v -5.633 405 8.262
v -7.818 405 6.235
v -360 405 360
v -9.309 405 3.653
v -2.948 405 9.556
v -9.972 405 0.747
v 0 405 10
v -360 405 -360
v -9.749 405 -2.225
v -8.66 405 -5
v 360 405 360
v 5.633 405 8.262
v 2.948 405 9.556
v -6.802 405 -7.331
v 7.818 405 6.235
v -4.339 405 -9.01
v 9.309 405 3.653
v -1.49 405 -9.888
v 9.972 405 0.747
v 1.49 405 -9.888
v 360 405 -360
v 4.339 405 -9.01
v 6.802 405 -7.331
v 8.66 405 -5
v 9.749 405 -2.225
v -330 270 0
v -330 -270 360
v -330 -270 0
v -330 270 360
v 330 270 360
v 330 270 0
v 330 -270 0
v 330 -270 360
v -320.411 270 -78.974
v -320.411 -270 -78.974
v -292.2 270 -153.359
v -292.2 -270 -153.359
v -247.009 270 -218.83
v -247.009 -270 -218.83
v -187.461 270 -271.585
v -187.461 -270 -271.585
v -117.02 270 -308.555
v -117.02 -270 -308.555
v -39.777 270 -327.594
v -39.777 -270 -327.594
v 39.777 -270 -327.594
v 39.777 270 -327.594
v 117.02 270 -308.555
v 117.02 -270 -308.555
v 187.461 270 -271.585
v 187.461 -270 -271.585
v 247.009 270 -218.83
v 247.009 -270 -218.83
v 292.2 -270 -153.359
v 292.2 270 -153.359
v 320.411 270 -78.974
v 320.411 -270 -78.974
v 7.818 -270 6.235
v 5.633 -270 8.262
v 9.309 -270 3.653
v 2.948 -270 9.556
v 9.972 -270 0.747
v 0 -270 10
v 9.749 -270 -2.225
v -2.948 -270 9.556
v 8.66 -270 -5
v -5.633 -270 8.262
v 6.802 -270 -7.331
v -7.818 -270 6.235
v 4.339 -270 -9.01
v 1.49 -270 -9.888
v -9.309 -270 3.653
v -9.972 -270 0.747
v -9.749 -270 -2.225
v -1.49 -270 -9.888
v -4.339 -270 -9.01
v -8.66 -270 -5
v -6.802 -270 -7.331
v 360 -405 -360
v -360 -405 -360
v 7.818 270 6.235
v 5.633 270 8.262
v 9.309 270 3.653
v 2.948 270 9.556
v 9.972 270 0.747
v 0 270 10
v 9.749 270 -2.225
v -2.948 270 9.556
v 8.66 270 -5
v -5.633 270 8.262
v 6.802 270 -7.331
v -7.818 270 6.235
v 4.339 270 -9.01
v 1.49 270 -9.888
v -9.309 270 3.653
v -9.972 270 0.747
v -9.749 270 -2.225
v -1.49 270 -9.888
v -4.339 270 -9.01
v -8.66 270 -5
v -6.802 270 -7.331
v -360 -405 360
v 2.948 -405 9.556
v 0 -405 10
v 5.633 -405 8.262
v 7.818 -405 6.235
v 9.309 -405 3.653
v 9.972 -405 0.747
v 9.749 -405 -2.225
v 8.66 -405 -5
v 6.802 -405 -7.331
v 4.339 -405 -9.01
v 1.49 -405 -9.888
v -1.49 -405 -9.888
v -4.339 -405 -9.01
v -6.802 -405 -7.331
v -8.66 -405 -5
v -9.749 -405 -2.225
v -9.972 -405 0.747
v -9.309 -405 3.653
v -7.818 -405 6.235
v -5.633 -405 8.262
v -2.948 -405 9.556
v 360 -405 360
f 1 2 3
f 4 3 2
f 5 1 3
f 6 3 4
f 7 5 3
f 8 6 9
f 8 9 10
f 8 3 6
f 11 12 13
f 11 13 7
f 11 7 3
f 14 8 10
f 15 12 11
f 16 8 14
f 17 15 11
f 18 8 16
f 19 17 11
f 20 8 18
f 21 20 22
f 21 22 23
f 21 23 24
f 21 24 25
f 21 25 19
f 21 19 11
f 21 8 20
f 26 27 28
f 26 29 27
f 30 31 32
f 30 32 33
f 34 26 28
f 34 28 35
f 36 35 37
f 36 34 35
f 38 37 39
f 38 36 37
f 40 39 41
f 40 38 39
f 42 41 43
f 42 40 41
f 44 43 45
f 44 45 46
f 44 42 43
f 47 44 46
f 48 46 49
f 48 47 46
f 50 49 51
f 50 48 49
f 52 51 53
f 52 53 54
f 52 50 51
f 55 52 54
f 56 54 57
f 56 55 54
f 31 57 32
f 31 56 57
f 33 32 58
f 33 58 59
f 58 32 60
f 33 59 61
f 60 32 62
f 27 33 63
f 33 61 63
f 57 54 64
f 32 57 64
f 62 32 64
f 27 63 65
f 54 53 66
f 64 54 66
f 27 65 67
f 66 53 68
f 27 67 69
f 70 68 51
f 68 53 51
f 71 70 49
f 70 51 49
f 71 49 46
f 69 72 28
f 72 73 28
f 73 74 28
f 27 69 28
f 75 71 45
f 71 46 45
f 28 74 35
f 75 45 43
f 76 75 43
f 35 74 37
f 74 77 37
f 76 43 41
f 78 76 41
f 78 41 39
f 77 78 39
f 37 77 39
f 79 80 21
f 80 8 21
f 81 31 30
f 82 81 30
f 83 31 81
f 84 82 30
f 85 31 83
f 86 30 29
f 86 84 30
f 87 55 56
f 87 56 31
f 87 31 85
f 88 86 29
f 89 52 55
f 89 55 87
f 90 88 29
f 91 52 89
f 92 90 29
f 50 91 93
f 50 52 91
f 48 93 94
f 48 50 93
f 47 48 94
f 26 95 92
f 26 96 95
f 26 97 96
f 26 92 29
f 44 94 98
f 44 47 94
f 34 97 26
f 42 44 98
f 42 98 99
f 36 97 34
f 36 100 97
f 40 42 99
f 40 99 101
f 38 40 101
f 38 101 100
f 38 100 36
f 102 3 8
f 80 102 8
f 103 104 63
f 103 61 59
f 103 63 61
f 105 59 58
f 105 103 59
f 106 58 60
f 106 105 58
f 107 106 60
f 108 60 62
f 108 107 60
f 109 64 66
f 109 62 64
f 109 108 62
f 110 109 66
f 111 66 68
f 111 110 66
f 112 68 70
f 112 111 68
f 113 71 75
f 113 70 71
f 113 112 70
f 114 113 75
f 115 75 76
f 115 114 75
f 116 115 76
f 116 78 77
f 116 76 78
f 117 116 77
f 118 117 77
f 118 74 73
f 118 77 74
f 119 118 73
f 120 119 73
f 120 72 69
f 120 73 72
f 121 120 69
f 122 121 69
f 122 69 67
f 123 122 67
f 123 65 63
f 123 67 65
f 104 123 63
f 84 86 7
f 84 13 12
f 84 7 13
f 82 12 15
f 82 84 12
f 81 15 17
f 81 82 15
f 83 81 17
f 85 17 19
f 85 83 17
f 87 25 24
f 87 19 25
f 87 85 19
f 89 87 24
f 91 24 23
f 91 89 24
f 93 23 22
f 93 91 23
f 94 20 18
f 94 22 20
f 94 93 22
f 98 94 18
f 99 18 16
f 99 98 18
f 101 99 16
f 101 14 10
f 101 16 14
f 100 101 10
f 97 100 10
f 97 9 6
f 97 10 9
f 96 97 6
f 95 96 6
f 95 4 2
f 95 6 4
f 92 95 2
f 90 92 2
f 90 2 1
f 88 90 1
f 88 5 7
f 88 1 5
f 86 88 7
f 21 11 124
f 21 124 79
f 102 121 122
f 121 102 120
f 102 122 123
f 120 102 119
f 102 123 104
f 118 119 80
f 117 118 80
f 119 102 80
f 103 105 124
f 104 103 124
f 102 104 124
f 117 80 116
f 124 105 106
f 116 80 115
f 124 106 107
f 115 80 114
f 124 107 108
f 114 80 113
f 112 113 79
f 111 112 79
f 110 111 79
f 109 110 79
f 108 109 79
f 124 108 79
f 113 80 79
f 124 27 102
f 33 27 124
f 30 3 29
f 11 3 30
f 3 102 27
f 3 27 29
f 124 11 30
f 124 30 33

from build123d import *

# Parameters (mm, degrees)
SKETCH_2_W               = 720
SKETCH_2_H               = 720
EXTRUDE_2_DEPTH          = 405
CUT_EXTRUDE_1_DEPTH      = 270
CUT_EXTRUDE_2_DEPTH      = 651.557453266
CUT_EXTRUDE_2_DEPTH_BACK = 651.557453266
SKETCH_3_R               = 10


with BuildPart() as part:
    # 草图2 → 凸台-拉伸2 (new, symmetric)
    with BuildSketch(Plane(origin=(0, 0, 0), x_dir=(1, 0, 0), z_dir=(0, 1, 0))):
        Rectangle(SKETCH_2_W, SKETCH_2_H)
    extrude(amount=EXTRUDE_2_DEPTH, both=True)

    # 草图1 → 切除-拉伸1 (cut, symmetric)
    with BuildSketch(Plane(origin=(0, 0, 0), x_dir=(1, 0, 0), z_dir=(0, 1, 0))):
        with BuildLine():
            Line((330, 0), (330, -360))
            Line((330, -360), (-330, -360))
            Line((-330, -360), (-330, 0))
            ThreePointArc((-330, 0), (0, 330), (330, 0))
        make_face()
    extrude(amount=CUT_EXTRUDE_1_DEPTH, both=True, mode=Mode.SUBTRACT)

    # 草图3 → 切除-拉伸2 (cut, two sides: drawn at the far end of the back side and taken through both)
    with BuildSketch(Plane(origin=(0, 0, 0), x_dir=(1, 0, 0), z_dir=(0, 1, 0)).offset(-CUT_EXTRUDE_2_DEPTH_BACK)):
        with Locations(Location((0, 0, 0), (0, 0, 270))):
            Circle(SKETCH_3_R)
    extrude(amount=CUT_EXTRUDE_2_DEPTH + CUT_EXTRUDE_2_DEPTH_BACK, mode=Mode.SUBTRACT)


solid = part.part
